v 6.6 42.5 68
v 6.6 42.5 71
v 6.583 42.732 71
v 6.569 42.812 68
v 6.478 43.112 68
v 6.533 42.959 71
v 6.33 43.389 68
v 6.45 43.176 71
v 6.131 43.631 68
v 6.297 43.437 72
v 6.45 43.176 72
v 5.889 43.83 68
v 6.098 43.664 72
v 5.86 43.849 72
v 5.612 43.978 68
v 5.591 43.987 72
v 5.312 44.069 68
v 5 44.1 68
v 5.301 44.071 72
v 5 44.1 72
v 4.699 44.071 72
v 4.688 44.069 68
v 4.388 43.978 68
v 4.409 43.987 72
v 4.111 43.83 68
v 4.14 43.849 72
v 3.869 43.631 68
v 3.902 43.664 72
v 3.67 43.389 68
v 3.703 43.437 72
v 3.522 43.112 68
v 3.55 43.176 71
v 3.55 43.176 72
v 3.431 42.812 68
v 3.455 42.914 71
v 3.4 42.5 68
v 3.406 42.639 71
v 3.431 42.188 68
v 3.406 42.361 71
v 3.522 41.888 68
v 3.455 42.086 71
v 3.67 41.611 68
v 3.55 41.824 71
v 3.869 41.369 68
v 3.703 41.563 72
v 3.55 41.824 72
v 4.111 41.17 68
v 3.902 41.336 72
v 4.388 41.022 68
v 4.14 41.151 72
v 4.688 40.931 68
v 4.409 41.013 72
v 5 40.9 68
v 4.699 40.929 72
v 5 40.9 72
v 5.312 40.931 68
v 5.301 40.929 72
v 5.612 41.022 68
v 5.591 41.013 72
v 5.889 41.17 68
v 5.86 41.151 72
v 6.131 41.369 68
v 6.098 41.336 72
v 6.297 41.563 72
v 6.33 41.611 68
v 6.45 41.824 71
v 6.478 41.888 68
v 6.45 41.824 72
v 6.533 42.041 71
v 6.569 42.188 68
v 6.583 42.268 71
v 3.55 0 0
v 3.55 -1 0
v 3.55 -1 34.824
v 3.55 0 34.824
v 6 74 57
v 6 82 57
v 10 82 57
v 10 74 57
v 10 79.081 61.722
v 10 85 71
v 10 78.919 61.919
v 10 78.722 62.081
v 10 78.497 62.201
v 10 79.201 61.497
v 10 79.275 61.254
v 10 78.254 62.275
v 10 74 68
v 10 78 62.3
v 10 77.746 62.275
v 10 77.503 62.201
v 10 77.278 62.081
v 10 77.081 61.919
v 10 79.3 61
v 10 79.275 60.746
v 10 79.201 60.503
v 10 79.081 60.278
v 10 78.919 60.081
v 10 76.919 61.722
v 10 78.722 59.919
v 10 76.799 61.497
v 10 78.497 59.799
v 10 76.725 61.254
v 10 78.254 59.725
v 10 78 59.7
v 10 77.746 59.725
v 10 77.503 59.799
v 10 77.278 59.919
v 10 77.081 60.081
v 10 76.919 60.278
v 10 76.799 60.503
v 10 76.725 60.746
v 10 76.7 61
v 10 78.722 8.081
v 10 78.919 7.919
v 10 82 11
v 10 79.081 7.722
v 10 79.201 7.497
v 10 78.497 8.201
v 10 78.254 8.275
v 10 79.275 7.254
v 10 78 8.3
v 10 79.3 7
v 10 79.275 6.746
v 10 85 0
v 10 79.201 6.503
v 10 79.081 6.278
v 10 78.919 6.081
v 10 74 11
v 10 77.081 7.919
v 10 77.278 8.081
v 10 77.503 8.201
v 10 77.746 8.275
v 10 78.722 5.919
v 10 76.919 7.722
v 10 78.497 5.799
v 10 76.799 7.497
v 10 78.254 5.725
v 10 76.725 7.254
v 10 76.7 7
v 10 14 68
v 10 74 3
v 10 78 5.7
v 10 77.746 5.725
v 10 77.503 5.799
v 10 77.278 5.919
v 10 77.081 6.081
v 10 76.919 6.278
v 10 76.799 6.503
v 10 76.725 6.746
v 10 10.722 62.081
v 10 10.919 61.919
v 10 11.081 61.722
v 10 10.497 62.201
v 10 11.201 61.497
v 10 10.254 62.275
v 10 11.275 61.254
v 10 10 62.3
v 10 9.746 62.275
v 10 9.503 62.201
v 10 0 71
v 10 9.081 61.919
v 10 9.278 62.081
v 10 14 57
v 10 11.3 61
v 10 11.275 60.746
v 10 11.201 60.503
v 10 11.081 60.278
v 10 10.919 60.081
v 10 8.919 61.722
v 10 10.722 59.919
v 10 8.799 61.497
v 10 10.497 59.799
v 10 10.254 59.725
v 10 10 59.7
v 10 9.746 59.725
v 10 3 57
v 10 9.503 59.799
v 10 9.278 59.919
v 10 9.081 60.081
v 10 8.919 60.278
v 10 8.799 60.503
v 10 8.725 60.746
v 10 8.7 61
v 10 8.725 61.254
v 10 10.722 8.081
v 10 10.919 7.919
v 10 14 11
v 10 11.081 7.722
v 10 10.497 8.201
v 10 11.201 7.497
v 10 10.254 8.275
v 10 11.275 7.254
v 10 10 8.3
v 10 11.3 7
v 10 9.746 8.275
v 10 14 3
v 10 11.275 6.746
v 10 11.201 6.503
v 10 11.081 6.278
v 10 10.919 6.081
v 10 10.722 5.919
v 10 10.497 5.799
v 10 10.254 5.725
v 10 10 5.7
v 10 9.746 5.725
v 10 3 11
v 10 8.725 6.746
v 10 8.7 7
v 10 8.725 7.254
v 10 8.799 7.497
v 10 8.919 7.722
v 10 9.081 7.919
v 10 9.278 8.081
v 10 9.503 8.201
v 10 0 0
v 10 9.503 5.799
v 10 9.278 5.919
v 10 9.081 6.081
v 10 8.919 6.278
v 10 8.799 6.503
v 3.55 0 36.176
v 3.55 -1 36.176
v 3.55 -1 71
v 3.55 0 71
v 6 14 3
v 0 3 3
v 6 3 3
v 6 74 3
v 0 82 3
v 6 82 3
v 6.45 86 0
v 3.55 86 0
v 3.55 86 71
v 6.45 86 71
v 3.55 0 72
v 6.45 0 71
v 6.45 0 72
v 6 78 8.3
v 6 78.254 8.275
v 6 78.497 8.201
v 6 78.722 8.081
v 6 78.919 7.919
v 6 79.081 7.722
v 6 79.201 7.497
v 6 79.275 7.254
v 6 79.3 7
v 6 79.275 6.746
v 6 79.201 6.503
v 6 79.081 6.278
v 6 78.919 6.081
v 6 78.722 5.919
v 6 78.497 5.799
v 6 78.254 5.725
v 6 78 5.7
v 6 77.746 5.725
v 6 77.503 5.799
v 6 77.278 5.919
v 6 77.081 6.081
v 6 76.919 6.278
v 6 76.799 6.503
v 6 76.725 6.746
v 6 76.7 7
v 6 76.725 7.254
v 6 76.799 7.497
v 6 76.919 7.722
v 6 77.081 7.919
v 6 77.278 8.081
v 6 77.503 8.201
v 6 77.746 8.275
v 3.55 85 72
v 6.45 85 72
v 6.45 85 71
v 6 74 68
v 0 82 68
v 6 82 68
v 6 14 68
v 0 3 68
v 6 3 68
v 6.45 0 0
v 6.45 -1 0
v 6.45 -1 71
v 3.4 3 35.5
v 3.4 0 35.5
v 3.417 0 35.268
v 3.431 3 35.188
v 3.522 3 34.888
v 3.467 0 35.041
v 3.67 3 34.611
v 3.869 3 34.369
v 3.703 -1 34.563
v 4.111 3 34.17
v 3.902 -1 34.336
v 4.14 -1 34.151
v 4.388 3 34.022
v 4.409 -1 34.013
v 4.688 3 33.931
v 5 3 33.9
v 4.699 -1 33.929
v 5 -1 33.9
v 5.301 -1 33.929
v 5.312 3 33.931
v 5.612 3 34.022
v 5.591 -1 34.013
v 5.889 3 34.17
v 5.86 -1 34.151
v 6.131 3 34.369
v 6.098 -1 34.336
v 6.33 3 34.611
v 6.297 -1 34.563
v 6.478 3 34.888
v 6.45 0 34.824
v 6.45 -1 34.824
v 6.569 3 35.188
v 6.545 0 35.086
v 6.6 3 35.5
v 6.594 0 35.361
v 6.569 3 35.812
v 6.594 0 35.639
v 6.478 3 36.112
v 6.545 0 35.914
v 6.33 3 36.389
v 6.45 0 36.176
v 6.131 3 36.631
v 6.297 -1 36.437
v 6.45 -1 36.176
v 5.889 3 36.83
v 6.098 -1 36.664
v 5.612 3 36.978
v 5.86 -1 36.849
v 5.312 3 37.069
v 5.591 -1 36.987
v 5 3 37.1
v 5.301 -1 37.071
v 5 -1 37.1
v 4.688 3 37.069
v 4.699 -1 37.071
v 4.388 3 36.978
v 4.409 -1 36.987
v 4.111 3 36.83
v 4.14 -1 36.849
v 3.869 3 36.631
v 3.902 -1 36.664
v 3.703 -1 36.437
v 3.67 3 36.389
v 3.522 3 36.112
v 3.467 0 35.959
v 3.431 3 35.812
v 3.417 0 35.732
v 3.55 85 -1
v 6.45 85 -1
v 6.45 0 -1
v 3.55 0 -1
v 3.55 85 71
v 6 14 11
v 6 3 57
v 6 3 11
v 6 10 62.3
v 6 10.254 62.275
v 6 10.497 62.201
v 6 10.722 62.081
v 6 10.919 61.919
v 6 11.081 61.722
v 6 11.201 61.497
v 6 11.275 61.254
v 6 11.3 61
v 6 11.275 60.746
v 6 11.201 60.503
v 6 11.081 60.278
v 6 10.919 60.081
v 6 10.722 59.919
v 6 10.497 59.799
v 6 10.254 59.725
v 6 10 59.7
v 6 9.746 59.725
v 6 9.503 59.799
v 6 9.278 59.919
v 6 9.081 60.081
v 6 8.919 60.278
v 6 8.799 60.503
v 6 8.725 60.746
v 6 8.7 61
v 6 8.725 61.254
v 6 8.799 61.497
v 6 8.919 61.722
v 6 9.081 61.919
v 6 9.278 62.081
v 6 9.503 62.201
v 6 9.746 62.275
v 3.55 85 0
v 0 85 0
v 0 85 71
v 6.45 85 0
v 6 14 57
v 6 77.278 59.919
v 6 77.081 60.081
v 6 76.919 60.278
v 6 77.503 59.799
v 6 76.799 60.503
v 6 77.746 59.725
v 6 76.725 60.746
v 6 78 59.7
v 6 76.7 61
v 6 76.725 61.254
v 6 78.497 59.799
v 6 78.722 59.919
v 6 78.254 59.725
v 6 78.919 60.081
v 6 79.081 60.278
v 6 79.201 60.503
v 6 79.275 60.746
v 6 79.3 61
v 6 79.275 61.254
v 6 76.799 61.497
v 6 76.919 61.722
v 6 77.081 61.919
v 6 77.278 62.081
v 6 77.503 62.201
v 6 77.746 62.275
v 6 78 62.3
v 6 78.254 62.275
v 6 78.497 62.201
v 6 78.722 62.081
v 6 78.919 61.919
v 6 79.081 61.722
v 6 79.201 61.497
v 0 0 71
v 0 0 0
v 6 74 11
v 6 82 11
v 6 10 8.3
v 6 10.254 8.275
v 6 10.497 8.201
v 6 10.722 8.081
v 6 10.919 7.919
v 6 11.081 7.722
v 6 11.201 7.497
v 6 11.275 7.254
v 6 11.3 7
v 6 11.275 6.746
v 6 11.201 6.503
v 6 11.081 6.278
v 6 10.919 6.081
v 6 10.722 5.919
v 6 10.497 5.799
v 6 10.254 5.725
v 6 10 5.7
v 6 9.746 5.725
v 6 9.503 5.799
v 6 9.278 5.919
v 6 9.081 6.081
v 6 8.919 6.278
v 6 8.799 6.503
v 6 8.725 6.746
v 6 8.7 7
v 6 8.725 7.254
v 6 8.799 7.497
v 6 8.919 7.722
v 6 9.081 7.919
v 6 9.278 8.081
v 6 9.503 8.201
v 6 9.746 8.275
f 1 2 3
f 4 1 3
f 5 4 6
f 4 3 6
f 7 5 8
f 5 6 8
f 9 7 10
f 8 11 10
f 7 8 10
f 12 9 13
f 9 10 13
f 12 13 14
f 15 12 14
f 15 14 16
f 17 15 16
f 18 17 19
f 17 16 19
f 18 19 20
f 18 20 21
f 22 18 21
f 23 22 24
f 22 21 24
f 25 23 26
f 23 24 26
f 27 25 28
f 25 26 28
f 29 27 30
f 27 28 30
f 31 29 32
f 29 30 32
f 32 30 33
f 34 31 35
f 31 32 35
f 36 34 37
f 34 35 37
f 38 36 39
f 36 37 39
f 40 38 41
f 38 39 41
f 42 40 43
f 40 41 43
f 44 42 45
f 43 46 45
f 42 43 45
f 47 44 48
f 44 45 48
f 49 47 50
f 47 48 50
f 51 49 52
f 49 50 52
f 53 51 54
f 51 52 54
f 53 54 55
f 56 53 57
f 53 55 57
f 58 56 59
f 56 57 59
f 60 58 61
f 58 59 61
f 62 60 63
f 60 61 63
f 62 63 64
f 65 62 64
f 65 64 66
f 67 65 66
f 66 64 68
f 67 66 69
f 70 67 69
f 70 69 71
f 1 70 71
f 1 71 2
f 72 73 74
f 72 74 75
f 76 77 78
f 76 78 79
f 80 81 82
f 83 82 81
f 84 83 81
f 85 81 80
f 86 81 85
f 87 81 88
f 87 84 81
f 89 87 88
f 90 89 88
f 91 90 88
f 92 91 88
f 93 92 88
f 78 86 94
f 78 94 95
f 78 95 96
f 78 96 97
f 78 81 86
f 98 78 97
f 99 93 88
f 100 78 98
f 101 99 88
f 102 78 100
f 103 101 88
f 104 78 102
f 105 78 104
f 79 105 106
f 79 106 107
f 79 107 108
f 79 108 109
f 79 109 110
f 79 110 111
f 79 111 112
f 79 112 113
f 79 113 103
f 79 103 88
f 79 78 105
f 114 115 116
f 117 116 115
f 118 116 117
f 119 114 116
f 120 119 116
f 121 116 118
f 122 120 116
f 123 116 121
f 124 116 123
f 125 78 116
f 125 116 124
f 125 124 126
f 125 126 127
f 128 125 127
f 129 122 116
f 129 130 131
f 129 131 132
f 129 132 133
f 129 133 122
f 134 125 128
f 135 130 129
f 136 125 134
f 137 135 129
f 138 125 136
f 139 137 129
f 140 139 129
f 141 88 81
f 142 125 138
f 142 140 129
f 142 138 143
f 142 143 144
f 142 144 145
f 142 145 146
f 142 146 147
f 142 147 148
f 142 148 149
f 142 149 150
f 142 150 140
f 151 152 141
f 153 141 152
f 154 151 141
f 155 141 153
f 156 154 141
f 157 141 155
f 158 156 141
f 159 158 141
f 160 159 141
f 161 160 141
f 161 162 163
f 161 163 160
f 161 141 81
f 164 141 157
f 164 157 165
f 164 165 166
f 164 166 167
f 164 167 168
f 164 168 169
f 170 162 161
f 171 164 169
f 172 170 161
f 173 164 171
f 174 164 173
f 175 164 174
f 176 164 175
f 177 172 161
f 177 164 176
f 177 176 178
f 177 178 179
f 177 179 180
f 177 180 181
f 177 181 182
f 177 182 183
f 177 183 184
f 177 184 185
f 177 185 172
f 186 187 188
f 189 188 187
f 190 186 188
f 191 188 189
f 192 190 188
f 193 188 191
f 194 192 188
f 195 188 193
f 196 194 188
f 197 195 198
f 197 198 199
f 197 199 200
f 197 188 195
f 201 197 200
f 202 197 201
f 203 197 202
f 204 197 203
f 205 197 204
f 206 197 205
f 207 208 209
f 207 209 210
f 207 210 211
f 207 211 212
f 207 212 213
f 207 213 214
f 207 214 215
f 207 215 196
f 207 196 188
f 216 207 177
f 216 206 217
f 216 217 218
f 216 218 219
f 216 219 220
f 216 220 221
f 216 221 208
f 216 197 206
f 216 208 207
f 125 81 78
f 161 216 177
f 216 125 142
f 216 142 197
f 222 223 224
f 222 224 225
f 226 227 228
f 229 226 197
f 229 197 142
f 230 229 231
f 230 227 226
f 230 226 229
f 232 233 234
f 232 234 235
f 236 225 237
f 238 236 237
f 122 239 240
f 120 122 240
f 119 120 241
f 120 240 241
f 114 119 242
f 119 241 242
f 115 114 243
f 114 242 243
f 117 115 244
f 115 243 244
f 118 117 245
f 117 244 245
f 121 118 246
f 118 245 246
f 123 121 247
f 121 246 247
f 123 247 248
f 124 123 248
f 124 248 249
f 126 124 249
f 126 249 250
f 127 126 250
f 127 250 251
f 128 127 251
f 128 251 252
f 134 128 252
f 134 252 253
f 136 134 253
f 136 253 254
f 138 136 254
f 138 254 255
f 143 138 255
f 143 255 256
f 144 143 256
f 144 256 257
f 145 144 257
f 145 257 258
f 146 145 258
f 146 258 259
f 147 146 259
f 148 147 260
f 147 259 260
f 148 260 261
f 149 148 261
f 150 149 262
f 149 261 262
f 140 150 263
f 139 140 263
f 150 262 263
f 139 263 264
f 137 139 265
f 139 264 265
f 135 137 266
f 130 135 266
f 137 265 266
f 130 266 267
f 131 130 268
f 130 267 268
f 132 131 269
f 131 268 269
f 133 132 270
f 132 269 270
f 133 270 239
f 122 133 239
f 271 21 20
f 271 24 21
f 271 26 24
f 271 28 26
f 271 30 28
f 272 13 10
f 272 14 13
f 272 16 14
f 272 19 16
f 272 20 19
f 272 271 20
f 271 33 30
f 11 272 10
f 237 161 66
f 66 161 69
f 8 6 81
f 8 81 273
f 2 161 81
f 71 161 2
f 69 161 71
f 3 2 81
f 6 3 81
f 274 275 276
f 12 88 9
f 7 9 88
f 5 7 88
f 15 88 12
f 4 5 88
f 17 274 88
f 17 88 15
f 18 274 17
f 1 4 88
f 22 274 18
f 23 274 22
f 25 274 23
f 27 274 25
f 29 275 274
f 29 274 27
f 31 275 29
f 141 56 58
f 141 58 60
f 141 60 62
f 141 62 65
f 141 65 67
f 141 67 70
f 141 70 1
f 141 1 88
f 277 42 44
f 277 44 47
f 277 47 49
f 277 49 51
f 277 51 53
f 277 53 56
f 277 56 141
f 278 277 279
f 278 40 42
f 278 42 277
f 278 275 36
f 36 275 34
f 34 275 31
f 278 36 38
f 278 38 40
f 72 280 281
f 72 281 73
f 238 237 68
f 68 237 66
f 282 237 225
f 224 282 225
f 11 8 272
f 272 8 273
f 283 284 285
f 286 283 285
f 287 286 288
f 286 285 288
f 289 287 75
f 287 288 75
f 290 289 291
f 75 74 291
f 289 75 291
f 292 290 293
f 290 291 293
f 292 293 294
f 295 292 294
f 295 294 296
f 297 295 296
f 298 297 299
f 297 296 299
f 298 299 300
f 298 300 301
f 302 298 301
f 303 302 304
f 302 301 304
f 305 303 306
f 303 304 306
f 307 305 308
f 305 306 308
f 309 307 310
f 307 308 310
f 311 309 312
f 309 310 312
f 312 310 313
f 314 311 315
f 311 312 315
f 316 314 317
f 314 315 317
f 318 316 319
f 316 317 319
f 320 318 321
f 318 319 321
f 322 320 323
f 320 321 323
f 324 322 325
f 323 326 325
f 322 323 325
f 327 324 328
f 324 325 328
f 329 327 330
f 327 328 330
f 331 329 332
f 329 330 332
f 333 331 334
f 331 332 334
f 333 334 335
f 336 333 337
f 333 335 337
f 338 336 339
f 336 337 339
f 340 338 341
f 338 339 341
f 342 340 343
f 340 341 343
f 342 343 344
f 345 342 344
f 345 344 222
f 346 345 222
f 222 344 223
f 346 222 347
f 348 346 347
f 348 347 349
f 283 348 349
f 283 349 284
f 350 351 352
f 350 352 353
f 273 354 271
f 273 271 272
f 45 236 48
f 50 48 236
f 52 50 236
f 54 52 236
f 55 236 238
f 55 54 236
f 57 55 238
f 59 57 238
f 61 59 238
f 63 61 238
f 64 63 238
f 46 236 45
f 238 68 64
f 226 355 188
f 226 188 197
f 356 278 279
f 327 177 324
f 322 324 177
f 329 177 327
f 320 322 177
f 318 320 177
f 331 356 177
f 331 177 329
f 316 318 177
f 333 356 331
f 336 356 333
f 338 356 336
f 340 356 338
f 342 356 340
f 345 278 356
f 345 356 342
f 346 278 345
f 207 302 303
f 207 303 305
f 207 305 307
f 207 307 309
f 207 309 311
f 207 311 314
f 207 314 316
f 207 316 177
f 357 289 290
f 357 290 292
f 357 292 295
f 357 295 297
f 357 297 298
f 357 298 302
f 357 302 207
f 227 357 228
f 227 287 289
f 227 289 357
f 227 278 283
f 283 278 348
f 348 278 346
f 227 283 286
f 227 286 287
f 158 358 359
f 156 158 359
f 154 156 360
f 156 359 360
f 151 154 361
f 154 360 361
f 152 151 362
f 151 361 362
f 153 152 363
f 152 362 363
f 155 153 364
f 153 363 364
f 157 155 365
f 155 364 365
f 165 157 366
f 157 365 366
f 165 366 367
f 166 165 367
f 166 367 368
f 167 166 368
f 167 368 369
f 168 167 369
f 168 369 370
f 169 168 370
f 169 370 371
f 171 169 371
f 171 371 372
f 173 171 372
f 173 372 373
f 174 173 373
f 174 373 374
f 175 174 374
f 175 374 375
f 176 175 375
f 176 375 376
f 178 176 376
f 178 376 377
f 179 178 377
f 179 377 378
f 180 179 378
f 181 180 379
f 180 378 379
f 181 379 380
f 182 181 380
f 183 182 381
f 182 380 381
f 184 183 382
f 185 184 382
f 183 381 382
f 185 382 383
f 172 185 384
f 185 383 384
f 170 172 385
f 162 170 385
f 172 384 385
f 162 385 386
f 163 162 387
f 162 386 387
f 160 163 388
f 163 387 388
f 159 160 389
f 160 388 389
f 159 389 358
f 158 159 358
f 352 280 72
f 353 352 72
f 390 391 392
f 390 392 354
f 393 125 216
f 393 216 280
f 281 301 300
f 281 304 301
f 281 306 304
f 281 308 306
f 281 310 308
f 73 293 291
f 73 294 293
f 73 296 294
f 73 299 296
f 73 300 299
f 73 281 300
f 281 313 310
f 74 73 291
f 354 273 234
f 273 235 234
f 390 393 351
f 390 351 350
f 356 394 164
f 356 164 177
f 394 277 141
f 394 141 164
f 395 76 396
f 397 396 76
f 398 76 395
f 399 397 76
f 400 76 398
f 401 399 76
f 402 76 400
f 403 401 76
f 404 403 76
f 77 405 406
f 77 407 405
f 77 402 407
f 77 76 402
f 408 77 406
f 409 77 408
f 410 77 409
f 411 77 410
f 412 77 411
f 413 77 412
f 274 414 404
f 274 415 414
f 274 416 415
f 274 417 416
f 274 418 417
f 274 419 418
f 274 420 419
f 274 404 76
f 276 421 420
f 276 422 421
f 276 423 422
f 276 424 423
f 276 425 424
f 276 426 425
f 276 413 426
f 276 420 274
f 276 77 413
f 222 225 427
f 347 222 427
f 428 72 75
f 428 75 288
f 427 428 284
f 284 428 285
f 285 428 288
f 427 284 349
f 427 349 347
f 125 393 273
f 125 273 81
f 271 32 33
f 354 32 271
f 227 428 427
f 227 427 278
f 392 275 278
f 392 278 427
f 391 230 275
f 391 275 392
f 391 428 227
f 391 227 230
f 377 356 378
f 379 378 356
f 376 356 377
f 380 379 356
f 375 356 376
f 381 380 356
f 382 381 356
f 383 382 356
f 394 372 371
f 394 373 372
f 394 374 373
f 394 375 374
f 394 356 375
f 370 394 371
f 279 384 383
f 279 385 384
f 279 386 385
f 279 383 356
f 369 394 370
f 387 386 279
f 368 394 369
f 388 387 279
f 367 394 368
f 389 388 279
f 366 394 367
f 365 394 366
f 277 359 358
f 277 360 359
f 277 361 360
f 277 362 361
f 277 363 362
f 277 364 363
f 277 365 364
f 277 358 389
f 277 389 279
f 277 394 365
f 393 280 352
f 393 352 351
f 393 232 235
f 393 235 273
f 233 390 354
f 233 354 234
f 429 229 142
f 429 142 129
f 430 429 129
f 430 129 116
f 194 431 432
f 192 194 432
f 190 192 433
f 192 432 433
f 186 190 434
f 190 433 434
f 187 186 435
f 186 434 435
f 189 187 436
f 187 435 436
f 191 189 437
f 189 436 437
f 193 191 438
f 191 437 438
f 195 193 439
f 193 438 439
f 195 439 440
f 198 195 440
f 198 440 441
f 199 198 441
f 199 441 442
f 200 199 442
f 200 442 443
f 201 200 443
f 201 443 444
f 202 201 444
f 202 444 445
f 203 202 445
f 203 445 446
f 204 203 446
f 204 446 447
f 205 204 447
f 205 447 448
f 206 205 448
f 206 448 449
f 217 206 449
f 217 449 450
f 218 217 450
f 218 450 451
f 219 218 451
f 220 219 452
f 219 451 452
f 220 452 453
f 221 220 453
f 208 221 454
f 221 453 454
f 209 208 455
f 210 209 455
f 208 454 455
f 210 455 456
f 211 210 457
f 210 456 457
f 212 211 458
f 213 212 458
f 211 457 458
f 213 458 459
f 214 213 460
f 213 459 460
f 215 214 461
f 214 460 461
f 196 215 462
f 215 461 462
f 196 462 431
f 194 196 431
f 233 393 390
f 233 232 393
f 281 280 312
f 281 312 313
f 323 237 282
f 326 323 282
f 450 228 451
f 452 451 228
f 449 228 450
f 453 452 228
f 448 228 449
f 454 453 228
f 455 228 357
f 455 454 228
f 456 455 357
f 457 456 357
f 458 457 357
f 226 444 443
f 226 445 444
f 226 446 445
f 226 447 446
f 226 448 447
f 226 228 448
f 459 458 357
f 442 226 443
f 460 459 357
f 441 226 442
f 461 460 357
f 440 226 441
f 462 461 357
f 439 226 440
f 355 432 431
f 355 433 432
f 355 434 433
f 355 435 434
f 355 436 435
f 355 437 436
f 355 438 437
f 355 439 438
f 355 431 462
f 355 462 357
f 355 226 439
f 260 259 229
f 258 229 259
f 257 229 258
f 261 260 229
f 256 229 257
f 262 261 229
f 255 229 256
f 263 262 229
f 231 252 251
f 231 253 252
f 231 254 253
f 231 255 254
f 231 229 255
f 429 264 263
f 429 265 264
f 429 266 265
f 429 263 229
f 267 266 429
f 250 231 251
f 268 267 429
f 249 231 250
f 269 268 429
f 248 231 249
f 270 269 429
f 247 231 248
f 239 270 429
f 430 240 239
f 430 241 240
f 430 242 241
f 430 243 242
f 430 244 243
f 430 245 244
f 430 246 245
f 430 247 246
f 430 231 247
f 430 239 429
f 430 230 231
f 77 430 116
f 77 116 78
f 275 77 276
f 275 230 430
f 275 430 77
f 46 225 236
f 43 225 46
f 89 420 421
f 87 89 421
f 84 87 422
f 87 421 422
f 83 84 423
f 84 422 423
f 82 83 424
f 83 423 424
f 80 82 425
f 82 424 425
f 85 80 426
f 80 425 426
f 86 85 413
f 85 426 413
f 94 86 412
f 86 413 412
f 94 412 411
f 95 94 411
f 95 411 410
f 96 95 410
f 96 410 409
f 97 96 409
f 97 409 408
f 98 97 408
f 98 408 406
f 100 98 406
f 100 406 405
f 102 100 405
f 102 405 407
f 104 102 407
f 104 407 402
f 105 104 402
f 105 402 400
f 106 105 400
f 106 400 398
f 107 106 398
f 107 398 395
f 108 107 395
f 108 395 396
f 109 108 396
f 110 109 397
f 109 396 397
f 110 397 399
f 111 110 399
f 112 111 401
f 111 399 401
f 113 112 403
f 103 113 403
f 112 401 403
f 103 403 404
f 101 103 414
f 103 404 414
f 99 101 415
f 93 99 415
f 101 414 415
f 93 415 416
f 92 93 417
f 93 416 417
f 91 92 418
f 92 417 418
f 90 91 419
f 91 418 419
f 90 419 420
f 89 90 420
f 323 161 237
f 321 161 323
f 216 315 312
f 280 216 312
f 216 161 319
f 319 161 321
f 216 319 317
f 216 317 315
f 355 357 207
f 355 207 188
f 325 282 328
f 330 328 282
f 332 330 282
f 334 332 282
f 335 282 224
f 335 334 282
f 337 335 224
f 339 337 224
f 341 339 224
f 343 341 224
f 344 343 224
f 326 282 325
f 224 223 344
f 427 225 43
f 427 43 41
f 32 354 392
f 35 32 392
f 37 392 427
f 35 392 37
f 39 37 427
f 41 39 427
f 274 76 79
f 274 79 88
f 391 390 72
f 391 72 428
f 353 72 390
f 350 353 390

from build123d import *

# Parameters (mm, degrees)
MAIN_DEPTH           = 71
SKETCH2_W            = 2.9
SKETCH2_H            = 85
MAKERBEAMRAIL1_DEPTH = 1
SKETCH3_W            = 2.9
SKETCH3_H            = 85
MAKERBEAMRAIL2_DEPTH = 1
SKETCH4_W            = 65
SKETCH4_H            = 79
BOARDCUT_DEPTH       = 6
SKETCH5_R            = 1.3
BOARDHOLES_DEPTH     = 5
SKETCH6_R            = 1.6
FIXHOLE1_DEPTH       = 4
MAINHOLE_DEPTH       = 5
FIXHOLE2_REACH       = 89
SKETCH8_R            = 1.6


with BuildPart() as part:
    # Sketch1 → Main (new body)
    with BuildSketch(Plane.XY):
        Polygon((0, 85), (3.55, 85), (3.55, 86), (6.45, 86), (6.45, 85), (10, 85), (10, 0), (6.45, 0), (6.45, -1), (3.55, -1), (3.55, 0), (0, 0), align=None)
    extrude(amount=MAIN_DEPTH)

    # Sketch2 → MakerBeamRail1 (add)
    with BuildSketch(Plane.XY.offset(71)):
        with Locations((5, 42.5)):
            Rectangle(SKETCH2_W, SKETCH2_H)
    extrude(amount=MAKERBEAMRAIL1_DEPTH)

    # Sketch3 → MakerBeamRail2 (add)
    with BuildSketch(Plane(origin=(0, 0, 0), x_dir=(-1, 0, 0), z_dir=(0, 0, -1))):
        with Locations((-5, 42.5)):
            Rectangle(SKETCH3_W, SKETCH3_H)
    extrude(amount=MAKERBEAMRAIL2_DEPTH)

    # Sketch4 → BoardCut (cut)
    with BuildSketch(Plane.ZY):
        with Locations((35.5, 42.5)):
            Rectangle(SKETCH4_W, SKETCH4_H)
    extrude(amount=-BOARDCUT_DEPTH, mode=Mode.SUBTRACT)

    # Sketch5 → BoardHoles (cut, through all)
    with BuildSketch(Plane.ZY.offset(-6)):
        with Locations((7, 78)):
            Circle(SKETCH5_R)
        with Locations((61, 78)):
            Circle(SKETCH5_R)
        with Locations((61, 10)):
            Circle(SKETCH5_R)
        with Locations((7, 10)):
            Circle(SKETCH5_R)
    extrude(amount=-BOARDHOLES_DEPTH, mode=Mode.SUBTRACT)

    # Sketch6 → FixHole1 (cut)
    with BuildSketch(Plane.XY.offset(72)):
        with Locations((5, 42.5)):
            Circle(SKETCH6_R)
    extrude(amount=-FIXHOLE1_DEPTH, mode=Mode.SUBTRACT)

    # Sketch7 → MainHole (cut, through all)
    with BuildSketch(Plane.ZY.offset(-6)):
        Polygon((3, 74), (11, 74), (11, 82), (57, 82), (57, 74), (68, 74), (68, 14), (57, 14), (57, 3), (11, 3), (11, 14), (3, 14), align=None)
    extrude(amount=-MAINHOLE_DEPTH, mode=Mode.SUBTRACT)

    # Sketch8 → FixHole2 (cut, up to next)
    with BuildSketch(Plane(origin=(0, -1, 0), x_dir=(-1, 0, 0), z_dir=(0, -1, 0)), mode=Mode.PRIVATE) as fixhole2_sk1:
        with Locations((-5, -35.5)):
            Circle(SKETCH8_R)
    fixhole2_tool1 = extrude(fixhole2_sk1.sketch, amount=-FIXHOLE2_REACH, mode=Mode.PRIVATE) & part.part
    add(fixhole2_tool1.solids().sort_by_distance((5, -1, 35.5))[0], mode=Mode.SUBTRACT)


solid = part.part
